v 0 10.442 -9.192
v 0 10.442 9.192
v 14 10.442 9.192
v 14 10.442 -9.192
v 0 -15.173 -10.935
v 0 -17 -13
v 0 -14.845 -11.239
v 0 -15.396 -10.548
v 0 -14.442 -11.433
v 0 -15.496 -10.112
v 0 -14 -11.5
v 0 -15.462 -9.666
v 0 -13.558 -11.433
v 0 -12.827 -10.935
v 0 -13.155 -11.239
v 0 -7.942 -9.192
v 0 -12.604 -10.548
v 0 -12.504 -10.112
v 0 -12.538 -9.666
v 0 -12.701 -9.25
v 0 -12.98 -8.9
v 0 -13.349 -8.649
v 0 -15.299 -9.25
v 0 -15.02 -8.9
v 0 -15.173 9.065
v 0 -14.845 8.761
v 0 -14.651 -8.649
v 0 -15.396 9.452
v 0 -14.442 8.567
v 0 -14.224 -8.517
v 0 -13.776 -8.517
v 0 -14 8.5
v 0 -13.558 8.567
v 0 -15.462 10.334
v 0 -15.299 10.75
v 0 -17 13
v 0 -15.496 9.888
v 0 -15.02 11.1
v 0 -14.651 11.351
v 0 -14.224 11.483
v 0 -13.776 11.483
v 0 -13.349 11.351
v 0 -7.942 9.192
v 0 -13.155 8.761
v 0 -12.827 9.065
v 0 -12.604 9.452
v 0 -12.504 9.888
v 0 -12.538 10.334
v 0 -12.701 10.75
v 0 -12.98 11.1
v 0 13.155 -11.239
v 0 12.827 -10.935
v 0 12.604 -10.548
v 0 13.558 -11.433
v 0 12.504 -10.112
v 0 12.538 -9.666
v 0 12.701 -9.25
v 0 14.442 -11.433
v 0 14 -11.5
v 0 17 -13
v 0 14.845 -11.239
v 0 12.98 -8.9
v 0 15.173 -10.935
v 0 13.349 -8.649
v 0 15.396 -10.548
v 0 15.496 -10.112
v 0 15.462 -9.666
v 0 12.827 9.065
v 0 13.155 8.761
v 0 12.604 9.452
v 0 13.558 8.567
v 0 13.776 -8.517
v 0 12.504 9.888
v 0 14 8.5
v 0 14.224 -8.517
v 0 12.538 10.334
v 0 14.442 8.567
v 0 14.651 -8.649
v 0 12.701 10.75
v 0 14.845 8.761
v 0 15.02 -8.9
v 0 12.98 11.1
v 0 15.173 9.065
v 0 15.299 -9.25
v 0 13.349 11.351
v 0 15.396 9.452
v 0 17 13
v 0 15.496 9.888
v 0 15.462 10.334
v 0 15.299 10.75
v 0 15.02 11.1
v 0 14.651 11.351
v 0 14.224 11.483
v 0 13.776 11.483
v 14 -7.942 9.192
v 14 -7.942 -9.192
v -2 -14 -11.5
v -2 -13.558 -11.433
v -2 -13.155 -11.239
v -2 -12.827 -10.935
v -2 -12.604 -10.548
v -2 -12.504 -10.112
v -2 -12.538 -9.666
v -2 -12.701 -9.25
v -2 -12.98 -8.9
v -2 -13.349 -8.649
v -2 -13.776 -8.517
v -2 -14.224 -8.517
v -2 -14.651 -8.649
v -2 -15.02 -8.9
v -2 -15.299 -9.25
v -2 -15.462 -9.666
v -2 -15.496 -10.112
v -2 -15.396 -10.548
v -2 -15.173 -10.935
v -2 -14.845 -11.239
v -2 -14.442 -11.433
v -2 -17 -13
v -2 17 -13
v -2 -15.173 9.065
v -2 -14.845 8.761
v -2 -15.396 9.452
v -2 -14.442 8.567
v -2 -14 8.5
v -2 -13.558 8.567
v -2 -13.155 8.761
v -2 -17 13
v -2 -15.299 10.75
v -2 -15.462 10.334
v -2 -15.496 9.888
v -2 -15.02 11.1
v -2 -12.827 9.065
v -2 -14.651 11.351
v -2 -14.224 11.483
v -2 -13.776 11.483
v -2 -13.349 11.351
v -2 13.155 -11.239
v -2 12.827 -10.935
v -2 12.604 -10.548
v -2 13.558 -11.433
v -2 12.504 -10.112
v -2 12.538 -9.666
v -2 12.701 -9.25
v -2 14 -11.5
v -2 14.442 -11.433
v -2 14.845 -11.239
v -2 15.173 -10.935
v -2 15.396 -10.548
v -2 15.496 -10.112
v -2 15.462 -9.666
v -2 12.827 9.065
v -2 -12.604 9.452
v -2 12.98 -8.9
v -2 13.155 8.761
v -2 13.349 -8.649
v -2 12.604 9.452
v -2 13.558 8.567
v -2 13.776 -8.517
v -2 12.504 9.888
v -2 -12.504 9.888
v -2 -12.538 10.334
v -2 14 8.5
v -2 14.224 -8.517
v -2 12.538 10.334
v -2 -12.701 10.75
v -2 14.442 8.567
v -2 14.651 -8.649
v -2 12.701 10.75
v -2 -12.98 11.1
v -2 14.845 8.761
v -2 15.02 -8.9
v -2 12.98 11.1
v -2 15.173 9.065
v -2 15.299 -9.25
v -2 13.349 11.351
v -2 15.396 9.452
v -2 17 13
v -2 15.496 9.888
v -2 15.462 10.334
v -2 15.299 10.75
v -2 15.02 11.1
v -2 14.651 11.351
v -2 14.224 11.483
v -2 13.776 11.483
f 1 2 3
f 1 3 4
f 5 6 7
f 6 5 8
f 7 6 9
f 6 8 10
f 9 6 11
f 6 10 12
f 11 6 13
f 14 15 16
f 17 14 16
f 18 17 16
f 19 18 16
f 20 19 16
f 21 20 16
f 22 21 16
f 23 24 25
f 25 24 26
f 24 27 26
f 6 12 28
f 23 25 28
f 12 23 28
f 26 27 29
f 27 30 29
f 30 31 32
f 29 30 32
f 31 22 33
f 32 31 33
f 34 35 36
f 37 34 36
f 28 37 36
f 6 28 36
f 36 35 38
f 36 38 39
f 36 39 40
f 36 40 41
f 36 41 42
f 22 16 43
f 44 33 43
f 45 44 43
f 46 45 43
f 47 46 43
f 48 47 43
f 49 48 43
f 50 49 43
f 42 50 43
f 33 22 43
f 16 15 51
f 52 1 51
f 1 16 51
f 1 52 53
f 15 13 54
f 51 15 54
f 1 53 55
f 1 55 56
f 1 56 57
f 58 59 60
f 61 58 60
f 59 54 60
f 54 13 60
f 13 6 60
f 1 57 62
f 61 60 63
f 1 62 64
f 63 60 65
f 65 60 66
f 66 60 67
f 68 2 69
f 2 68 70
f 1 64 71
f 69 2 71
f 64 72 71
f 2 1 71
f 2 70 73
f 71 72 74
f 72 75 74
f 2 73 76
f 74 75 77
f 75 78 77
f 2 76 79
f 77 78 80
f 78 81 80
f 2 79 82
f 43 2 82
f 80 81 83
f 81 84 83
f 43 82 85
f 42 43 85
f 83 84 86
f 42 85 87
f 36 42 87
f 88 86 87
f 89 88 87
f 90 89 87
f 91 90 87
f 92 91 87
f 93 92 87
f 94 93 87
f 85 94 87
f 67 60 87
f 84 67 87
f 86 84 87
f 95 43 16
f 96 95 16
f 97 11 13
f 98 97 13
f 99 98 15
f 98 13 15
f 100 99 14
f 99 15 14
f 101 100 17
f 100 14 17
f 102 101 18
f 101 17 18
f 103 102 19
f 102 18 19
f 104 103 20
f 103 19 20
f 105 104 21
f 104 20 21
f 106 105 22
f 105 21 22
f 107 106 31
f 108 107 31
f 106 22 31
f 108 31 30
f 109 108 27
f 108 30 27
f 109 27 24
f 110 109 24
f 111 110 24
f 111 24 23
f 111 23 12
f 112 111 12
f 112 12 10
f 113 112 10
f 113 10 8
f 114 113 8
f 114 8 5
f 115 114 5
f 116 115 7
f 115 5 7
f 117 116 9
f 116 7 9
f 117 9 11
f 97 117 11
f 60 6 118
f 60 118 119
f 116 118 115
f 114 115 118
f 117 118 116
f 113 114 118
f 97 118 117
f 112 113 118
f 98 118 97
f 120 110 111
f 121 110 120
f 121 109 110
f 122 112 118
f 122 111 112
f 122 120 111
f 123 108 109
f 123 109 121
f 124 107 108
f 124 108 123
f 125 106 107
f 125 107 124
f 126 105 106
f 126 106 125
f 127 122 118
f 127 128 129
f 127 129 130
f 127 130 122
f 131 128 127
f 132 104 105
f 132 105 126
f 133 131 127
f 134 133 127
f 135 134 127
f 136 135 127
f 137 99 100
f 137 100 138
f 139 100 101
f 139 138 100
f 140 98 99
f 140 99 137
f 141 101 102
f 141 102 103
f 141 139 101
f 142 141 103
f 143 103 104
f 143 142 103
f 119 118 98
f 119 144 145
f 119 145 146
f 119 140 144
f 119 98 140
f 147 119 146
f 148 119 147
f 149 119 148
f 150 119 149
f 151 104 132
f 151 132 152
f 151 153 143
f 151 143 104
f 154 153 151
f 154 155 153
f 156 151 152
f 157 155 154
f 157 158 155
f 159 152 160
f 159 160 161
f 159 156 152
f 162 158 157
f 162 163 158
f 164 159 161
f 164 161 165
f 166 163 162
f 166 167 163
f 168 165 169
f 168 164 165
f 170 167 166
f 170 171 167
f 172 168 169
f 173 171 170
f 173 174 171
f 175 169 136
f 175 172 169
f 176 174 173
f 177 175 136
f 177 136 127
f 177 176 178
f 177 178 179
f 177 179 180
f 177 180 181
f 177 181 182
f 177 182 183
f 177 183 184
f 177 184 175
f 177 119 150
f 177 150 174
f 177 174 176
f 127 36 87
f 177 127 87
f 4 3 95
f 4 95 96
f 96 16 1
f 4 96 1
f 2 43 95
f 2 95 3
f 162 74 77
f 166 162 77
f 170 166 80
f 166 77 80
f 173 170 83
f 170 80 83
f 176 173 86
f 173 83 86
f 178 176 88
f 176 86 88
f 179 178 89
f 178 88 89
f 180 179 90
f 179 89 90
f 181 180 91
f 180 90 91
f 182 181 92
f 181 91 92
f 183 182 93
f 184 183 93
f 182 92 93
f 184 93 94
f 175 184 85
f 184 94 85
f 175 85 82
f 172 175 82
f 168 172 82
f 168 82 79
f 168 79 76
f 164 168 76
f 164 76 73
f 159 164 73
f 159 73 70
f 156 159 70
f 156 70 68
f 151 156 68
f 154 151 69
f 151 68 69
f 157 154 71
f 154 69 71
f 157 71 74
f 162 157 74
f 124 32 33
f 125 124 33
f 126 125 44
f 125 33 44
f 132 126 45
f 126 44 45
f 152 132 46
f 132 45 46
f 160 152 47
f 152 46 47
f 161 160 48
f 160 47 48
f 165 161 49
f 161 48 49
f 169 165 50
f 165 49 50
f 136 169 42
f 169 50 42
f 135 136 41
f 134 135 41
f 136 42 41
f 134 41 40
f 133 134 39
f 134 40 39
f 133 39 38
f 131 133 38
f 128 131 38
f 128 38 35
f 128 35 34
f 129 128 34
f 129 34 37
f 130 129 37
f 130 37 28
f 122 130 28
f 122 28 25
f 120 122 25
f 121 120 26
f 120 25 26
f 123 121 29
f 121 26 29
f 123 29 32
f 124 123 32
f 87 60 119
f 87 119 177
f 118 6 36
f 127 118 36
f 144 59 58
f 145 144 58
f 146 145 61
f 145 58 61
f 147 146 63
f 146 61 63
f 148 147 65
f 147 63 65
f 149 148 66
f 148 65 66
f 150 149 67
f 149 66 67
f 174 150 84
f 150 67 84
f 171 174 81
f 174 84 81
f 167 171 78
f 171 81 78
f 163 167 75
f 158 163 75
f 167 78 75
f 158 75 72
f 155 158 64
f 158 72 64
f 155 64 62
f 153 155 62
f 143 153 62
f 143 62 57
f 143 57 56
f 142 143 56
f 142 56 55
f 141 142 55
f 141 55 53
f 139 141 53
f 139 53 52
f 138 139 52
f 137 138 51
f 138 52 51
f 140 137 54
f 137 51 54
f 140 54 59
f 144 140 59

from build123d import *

# Parameters (mm, degrees)
SKETCH_1_W          = 18.38477631
SKETCH_1_H          = 18.38477631
EXTRUDE_2_DEPTH     = 14
SKETCH_5_W          = 26
SKETCH_5_H          = 34
EXTRUDE_4_DEPTH     = 2
SKETCH_6_R          = 1.5
CUT_EXTRUDE_1_DEPTH = 2


with BuildPart() as part:
    # 草图1 → 凸台-拉伸2 (new body)
    with BuildSketch(Plane(origin=(0, 0, 0), x_dir=(0, 0, -1), z_dir=(1, 0, 0))):
        with Locations((0, 1.25)):
            Rectangle(SKETCH_1_W, SKETCH_1_H)
    extrude(amount=EXTRUDE_2_DEPTH)

    # 草图5 → 凸台-拉伸4 (add)
    with BuildSketch(Plane.ZY):
        Rectangle(SKETCH_5_W, SKETCH_5_H)
    extrude(amount=EXTRUDE_4_DEPTH)

    # 草图6 → 切除-拉伸1 (cut)
    with BuildSketch(Plane(origin=(0, 0, 0), x_dir=(0, 0, -1), z_dir=(1, 0, 0))):
        with Locations((-10, 14)):
            Circle(SKETCH_6_R)
        with Locations((10, 14)):
            Circle(SKETCH_6_R)
        with Locations((-10, -14)):
            Circle(SKETCH_6_R)
        with Locations((10, -14)):
            Circle(SKETCH_6_R)
    extrude(amount=-CUT_EXTRUDE_1_DEPTH, mode=Mode.SUBTRACT)


solid = part.part
